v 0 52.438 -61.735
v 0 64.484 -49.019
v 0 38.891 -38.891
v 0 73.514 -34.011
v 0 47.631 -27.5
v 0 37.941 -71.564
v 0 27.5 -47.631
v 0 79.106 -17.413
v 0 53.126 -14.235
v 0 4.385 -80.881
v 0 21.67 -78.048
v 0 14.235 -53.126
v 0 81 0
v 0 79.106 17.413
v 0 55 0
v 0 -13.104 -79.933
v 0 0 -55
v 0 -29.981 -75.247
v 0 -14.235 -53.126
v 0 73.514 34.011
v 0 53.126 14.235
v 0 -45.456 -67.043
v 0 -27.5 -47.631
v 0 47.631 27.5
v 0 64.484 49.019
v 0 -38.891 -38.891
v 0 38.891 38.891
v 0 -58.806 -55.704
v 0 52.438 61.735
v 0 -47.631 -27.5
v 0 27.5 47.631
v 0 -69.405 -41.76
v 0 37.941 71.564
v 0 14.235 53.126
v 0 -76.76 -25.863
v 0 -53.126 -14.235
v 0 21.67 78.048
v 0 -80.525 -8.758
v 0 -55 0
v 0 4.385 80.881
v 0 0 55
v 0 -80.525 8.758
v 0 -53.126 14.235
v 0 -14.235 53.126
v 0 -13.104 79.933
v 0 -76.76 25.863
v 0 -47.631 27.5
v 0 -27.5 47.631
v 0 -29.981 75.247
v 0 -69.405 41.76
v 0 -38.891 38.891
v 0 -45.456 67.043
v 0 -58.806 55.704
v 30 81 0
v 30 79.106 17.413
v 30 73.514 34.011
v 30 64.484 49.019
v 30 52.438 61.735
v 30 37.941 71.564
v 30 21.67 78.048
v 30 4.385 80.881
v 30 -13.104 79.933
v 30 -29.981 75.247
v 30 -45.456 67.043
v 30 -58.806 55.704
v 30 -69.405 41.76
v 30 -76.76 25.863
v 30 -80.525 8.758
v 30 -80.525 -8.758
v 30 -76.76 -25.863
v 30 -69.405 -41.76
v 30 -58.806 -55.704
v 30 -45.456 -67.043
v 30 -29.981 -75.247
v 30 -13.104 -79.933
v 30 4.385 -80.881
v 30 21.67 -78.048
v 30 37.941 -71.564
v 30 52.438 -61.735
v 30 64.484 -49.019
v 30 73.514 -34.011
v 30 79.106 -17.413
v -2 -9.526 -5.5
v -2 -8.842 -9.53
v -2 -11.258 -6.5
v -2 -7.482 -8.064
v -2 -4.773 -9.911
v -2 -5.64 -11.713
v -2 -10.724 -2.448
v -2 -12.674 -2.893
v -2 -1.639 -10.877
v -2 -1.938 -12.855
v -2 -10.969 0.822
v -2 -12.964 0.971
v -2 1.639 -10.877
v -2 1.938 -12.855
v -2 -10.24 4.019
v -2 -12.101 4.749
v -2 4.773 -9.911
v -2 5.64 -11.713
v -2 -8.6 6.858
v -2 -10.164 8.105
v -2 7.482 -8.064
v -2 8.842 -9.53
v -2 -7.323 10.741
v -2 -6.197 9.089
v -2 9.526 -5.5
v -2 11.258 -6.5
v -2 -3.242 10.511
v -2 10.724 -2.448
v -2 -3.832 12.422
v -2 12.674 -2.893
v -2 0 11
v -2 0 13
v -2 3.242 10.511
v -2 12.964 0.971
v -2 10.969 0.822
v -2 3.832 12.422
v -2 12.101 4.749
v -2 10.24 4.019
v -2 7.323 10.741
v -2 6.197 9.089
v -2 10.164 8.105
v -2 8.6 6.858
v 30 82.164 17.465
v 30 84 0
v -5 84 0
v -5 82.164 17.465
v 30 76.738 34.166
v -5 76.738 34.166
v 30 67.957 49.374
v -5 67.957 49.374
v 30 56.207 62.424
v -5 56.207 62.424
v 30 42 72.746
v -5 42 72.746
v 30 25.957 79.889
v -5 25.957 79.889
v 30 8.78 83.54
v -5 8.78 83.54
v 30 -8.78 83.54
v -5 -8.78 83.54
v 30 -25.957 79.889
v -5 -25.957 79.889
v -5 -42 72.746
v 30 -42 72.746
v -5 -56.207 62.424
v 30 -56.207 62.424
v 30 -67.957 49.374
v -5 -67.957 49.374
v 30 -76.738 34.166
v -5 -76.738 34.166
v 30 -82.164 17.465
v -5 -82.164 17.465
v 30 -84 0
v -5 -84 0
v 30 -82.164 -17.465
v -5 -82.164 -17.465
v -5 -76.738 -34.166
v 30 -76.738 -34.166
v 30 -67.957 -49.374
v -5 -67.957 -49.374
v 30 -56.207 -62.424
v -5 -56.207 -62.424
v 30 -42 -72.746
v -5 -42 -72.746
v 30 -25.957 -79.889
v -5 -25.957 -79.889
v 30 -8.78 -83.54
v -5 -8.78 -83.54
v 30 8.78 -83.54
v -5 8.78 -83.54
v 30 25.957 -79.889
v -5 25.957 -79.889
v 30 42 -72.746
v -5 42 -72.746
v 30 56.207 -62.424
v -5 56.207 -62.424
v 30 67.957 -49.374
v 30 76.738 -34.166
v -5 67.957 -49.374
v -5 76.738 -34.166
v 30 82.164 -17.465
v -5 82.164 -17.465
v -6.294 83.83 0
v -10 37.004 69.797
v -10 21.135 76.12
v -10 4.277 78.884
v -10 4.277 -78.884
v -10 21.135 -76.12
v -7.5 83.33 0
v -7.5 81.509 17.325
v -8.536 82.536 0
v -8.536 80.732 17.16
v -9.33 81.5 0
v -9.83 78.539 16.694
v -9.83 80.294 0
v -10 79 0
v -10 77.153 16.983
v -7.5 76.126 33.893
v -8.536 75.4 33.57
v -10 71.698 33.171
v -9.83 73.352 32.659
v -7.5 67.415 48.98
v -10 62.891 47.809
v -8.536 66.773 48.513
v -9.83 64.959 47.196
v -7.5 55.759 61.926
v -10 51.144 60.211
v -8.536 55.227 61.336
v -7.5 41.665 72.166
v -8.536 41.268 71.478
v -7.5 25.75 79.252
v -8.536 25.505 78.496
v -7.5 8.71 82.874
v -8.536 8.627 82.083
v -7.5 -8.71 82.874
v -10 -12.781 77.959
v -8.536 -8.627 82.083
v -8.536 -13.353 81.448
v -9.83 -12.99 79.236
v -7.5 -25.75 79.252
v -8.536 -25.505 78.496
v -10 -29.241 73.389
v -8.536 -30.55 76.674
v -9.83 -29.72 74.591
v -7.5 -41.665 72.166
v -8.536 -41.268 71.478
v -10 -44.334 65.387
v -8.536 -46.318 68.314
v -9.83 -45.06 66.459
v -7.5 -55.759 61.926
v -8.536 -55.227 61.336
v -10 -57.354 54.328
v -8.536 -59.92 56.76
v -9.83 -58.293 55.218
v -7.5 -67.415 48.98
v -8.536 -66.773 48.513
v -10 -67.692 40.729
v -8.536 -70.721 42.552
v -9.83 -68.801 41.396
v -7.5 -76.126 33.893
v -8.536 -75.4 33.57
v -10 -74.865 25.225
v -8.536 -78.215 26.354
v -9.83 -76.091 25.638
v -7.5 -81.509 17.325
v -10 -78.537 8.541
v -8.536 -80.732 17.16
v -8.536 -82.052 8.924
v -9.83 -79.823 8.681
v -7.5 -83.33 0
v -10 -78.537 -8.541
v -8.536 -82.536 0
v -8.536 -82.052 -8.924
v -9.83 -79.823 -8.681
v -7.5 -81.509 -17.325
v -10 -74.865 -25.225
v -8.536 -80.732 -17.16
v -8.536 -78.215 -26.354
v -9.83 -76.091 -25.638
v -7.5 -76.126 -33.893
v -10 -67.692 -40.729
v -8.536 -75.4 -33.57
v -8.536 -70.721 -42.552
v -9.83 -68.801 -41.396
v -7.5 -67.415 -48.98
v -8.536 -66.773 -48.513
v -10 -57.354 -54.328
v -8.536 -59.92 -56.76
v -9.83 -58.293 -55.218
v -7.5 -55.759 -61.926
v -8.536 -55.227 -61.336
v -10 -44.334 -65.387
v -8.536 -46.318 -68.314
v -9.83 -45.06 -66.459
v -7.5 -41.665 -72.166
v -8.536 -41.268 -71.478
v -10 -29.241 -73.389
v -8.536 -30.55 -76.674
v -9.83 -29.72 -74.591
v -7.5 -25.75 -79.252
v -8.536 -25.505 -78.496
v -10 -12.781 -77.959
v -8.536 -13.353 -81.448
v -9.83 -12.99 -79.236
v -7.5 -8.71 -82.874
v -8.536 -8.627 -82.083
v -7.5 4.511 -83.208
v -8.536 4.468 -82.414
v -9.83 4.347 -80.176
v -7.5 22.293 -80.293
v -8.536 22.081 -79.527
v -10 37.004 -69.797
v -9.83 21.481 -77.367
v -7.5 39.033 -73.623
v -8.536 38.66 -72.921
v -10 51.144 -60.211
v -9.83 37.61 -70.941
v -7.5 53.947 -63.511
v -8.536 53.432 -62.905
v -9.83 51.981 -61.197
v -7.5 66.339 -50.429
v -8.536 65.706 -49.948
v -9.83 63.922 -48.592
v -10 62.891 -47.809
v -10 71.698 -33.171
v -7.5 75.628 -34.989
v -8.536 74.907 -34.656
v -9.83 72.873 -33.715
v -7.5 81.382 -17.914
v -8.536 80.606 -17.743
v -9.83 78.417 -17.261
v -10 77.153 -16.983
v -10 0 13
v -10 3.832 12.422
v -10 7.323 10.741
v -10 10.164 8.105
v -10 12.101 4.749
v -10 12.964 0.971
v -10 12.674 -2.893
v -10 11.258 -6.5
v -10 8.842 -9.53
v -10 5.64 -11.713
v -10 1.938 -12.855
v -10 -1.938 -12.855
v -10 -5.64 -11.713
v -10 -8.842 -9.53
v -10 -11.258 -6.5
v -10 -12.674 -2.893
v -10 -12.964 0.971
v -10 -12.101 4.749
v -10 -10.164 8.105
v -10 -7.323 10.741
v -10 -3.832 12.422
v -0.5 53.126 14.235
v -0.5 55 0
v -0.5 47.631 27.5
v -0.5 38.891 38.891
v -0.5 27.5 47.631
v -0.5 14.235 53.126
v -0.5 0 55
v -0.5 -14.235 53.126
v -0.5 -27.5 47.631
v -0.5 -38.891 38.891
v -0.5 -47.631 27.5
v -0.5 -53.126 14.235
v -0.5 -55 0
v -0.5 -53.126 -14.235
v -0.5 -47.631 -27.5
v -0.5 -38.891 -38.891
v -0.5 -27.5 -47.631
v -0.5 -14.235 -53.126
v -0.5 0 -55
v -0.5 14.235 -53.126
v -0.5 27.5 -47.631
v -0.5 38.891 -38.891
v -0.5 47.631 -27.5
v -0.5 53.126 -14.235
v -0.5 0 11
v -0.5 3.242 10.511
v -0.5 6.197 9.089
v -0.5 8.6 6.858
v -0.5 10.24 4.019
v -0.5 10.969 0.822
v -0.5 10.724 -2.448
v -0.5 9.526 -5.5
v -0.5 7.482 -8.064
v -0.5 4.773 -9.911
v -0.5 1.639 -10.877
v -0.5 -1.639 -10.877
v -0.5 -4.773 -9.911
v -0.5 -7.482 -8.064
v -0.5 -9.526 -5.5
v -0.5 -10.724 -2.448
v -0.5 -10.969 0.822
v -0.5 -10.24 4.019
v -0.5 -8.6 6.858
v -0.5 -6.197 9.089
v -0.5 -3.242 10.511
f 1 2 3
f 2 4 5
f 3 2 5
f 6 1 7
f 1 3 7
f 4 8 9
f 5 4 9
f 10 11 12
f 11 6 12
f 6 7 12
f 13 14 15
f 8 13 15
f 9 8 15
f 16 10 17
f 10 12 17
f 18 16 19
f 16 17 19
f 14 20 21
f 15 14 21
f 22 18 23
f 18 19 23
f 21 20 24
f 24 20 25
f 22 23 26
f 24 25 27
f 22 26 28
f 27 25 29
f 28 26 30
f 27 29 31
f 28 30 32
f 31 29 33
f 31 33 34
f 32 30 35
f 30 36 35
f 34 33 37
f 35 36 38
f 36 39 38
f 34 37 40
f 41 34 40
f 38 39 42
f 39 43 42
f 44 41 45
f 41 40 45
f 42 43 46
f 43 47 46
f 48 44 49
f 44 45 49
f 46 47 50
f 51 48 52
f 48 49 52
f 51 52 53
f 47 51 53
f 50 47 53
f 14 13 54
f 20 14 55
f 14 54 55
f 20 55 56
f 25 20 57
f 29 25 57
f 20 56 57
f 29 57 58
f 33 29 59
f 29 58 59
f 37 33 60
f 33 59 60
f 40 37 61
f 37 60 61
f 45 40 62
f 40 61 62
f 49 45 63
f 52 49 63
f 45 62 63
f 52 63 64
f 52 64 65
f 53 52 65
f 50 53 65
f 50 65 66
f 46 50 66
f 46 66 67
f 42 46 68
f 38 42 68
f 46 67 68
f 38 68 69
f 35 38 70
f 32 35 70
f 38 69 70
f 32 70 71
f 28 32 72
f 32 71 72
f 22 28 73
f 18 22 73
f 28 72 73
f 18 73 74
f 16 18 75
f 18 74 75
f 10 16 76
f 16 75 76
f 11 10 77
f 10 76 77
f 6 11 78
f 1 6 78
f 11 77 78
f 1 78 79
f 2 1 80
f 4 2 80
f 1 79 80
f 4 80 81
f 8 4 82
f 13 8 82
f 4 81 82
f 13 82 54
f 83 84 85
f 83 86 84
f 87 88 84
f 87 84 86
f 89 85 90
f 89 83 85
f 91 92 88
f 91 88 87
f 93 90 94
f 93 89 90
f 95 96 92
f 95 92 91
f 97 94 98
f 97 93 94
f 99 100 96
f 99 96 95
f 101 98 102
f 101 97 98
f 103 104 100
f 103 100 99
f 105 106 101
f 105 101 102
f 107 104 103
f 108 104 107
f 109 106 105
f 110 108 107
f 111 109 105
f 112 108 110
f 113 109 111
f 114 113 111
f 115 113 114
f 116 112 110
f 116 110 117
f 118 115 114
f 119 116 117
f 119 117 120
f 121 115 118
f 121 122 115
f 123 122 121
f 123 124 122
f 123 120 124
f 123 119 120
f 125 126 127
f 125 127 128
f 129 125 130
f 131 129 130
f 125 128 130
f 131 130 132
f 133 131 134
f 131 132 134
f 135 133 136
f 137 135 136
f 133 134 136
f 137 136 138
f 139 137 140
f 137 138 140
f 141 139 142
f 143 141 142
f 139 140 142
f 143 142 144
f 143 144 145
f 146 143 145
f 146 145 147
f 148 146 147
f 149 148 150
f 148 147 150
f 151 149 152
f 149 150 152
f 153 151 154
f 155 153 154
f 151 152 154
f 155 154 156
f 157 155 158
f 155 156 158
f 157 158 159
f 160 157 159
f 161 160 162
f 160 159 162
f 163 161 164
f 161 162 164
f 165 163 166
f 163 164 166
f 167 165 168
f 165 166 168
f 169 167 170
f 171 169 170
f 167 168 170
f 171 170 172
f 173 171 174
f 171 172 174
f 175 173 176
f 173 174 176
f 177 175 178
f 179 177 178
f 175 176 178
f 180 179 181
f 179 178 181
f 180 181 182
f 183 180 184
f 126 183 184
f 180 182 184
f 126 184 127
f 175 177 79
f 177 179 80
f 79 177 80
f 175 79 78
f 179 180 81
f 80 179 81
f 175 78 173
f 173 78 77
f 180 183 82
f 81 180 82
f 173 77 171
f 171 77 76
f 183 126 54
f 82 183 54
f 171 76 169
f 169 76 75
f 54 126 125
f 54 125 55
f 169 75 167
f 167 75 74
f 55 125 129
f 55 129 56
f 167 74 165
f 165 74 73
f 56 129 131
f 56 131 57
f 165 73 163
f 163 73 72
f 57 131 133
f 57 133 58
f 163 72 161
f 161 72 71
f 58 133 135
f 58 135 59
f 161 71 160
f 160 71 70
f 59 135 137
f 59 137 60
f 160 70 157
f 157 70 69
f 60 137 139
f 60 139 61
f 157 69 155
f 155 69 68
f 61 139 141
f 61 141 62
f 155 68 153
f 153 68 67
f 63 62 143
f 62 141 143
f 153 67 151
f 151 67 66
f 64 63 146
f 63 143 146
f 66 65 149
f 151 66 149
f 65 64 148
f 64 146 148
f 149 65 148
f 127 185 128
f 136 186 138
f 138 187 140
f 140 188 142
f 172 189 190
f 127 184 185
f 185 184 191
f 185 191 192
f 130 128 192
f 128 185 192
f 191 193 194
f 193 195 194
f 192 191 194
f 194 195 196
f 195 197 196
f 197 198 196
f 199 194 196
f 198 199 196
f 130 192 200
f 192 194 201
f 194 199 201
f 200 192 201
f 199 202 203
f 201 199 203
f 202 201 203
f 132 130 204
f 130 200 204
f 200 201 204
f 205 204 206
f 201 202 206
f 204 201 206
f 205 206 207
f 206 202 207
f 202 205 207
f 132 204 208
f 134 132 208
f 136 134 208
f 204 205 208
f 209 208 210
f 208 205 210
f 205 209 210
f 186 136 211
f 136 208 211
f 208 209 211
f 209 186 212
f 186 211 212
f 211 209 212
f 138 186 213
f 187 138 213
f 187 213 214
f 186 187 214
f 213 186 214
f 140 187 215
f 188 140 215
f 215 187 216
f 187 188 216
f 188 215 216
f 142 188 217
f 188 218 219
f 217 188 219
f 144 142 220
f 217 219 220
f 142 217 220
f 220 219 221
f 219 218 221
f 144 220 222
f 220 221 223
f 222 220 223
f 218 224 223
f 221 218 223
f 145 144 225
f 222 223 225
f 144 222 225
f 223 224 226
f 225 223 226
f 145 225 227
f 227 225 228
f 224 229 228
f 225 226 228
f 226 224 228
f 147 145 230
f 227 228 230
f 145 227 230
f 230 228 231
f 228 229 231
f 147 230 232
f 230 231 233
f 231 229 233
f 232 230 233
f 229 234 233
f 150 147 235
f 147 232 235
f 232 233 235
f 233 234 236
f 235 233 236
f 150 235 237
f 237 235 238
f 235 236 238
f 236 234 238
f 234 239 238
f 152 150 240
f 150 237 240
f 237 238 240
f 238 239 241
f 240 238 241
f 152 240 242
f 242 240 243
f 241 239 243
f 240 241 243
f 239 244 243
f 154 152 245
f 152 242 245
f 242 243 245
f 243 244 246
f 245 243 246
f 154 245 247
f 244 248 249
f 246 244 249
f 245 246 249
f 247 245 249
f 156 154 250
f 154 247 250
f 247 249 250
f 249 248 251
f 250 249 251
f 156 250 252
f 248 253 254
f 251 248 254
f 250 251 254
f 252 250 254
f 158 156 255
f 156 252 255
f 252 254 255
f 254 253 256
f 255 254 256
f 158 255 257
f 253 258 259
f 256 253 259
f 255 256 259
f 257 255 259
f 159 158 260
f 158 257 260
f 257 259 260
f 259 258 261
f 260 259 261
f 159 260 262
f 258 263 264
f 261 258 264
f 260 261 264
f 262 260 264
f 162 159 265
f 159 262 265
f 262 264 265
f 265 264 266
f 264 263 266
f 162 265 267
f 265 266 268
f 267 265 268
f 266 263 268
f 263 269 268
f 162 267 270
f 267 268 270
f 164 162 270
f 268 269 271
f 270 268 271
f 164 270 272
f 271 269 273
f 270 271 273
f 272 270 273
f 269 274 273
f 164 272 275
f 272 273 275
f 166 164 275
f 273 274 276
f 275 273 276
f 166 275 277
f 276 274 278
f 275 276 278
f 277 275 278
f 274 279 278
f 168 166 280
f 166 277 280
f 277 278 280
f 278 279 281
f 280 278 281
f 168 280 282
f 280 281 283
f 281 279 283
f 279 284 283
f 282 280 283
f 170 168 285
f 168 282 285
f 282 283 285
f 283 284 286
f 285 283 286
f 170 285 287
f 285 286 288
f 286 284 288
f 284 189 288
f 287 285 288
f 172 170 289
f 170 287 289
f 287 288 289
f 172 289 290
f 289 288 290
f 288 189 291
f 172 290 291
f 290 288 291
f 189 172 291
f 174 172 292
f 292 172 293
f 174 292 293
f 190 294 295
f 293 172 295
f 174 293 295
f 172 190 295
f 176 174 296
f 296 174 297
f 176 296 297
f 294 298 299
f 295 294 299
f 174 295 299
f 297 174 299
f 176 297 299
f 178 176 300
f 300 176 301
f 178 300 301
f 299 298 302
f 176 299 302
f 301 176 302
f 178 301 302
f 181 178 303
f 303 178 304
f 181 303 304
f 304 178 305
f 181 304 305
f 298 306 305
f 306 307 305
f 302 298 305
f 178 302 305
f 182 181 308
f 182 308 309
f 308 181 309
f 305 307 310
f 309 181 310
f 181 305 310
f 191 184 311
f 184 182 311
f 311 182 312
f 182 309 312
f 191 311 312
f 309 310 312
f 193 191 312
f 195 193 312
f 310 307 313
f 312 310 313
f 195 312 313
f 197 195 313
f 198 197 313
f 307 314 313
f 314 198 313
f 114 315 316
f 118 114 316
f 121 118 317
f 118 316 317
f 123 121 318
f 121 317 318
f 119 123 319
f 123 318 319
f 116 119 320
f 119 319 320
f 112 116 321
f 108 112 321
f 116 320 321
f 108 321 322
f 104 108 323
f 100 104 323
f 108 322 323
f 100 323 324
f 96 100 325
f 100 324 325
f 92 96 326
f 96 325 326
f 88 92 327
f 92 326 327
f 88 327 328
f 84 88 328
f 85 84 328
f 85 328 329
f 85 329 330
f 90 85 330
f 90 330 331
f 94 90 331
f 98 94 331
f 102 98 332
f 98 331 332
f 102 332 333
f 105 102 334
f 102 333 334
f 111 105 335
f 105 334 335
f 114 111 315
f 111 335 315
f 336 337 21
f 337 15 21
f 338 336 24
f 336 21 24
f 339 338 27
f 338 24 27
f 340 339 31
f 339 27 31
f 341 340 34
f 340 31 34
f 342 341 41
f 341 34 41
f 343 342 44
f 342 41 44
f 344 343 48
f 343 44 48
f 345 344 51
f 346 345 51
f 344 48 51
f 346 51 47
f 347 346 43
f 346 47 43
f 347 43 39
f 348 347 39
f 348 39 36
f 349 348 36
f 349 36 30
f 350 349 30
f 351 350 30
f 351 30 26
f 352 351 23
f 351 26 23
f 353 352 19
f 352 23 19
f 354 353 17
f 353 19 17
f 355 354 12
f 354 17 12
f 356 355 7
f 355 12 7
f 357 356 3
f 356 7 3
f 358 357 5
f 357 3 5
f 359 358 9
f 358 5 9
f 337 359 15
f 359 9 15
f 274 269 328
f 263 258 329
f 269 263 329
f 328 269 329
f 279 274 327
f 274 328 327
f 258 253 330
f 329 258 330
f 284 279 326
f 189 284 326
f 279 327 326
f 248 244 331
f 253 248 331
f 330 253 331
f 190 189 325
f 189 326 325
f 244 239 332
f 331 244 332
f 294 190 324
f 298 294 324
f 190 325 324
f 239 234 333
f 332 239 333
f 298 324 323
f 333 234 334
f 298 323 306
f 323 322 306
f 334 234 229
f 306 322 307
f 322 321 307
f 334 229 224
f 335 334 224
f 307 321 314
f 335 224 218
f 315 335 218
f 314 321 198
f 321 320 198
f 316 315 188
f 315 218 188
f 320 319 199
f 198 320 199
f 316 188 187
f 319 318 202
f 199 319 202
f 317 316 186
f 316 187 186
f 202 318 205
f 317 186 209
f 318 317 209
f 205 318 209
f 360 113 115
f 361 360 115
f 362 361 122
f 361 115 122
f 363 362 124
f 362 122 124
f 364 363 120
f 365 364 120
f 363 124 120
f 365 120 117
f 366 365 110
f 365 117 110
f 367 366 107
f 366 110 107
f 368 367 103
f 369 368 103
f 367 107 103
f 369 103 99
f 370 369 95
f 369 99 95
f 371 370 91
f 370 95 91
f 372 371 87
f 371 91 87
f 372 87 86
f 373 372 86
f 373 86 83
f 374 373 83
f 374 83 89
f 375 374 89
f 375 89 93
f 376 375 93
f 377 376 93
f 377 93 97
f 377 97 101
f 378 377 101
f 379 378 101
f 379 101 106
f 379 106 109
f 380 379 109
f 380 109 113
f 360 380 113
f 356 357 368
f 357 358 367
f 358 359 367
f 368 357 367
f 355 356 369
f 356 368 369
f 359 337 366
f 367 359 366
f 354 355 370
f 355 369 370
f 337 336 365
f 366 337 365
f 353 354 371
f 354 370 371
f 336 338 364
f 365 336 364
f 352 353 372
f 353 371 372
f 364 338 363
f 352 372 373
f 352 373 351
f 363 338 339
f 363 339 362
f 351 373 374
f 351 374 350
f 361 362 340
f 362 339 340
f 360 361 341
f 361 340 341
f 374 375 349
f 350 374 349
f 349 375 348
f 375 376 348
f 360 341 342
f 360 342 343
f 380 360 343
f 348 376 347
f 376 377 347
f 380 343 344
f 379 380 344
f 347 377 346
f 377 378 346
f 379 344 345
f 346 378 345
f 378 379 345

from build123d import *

# Parameters (mm, degrees)
FILLET1_R          = 5
SKETCH3_R          = 11
CUT_EXTRUDE2_DEPTH = 41
SKETCH6_W          = 0.5
SKETCH6_H          = 55
SKETCH9_R          = 13
CUT_EXTRUDE3_DEPTH = 8


with BuildPart() as part:
    # Sketch1 → Revolve1 (revolve)
    with BuildSketch(Plane.XY):
        Polygon((0, 0), (0, 81), (30, 81), (30, 84), (-10, 84), (-10, 0), align=None)
    revolve(axis=Axis((-10, 0, 0), (1, 0, 0)))

    # Fillet1
    fillet1_edges = [part.edges().sort_by_distance(p)[0] for p in [
        (-10, -84, 0),
    ]]
    fillet(fillet1_edges, radius=FILLET1_R)

    # Sketch3 → Cut-Extrude2 (cut, through all)
    with BuildSketch(Plane.ZY.offset(10)):
        Circle(SKETCH3_R)
    extrude(amount=-CUT_EXTRUDE2_DEPTH, mode=Mode.SUBTRACT)

    # Sketch6 → Cut-Revolve2 (revolve, cut)
    with BuildSketch(Plane.XY):
        with Locations((-0.25, 27.5)):
            Rectangle(SKETCH6_W, SKETCH6_H)
    revolve(axis=Axis((-10, 0, 0), (1, 0, 0)), mode=Mode.SUBTRACT)

    # Sketch9 → Cut-Extrude3 (cut)
    with BuildSketch(Plane.ZY.offset(10)):
        Circle(SKETCH9_R)
    extrude(amount=-CUT_EXTRUDE3_DEPTH, mode=Mode.SUBTRACT)


solid = part.part
